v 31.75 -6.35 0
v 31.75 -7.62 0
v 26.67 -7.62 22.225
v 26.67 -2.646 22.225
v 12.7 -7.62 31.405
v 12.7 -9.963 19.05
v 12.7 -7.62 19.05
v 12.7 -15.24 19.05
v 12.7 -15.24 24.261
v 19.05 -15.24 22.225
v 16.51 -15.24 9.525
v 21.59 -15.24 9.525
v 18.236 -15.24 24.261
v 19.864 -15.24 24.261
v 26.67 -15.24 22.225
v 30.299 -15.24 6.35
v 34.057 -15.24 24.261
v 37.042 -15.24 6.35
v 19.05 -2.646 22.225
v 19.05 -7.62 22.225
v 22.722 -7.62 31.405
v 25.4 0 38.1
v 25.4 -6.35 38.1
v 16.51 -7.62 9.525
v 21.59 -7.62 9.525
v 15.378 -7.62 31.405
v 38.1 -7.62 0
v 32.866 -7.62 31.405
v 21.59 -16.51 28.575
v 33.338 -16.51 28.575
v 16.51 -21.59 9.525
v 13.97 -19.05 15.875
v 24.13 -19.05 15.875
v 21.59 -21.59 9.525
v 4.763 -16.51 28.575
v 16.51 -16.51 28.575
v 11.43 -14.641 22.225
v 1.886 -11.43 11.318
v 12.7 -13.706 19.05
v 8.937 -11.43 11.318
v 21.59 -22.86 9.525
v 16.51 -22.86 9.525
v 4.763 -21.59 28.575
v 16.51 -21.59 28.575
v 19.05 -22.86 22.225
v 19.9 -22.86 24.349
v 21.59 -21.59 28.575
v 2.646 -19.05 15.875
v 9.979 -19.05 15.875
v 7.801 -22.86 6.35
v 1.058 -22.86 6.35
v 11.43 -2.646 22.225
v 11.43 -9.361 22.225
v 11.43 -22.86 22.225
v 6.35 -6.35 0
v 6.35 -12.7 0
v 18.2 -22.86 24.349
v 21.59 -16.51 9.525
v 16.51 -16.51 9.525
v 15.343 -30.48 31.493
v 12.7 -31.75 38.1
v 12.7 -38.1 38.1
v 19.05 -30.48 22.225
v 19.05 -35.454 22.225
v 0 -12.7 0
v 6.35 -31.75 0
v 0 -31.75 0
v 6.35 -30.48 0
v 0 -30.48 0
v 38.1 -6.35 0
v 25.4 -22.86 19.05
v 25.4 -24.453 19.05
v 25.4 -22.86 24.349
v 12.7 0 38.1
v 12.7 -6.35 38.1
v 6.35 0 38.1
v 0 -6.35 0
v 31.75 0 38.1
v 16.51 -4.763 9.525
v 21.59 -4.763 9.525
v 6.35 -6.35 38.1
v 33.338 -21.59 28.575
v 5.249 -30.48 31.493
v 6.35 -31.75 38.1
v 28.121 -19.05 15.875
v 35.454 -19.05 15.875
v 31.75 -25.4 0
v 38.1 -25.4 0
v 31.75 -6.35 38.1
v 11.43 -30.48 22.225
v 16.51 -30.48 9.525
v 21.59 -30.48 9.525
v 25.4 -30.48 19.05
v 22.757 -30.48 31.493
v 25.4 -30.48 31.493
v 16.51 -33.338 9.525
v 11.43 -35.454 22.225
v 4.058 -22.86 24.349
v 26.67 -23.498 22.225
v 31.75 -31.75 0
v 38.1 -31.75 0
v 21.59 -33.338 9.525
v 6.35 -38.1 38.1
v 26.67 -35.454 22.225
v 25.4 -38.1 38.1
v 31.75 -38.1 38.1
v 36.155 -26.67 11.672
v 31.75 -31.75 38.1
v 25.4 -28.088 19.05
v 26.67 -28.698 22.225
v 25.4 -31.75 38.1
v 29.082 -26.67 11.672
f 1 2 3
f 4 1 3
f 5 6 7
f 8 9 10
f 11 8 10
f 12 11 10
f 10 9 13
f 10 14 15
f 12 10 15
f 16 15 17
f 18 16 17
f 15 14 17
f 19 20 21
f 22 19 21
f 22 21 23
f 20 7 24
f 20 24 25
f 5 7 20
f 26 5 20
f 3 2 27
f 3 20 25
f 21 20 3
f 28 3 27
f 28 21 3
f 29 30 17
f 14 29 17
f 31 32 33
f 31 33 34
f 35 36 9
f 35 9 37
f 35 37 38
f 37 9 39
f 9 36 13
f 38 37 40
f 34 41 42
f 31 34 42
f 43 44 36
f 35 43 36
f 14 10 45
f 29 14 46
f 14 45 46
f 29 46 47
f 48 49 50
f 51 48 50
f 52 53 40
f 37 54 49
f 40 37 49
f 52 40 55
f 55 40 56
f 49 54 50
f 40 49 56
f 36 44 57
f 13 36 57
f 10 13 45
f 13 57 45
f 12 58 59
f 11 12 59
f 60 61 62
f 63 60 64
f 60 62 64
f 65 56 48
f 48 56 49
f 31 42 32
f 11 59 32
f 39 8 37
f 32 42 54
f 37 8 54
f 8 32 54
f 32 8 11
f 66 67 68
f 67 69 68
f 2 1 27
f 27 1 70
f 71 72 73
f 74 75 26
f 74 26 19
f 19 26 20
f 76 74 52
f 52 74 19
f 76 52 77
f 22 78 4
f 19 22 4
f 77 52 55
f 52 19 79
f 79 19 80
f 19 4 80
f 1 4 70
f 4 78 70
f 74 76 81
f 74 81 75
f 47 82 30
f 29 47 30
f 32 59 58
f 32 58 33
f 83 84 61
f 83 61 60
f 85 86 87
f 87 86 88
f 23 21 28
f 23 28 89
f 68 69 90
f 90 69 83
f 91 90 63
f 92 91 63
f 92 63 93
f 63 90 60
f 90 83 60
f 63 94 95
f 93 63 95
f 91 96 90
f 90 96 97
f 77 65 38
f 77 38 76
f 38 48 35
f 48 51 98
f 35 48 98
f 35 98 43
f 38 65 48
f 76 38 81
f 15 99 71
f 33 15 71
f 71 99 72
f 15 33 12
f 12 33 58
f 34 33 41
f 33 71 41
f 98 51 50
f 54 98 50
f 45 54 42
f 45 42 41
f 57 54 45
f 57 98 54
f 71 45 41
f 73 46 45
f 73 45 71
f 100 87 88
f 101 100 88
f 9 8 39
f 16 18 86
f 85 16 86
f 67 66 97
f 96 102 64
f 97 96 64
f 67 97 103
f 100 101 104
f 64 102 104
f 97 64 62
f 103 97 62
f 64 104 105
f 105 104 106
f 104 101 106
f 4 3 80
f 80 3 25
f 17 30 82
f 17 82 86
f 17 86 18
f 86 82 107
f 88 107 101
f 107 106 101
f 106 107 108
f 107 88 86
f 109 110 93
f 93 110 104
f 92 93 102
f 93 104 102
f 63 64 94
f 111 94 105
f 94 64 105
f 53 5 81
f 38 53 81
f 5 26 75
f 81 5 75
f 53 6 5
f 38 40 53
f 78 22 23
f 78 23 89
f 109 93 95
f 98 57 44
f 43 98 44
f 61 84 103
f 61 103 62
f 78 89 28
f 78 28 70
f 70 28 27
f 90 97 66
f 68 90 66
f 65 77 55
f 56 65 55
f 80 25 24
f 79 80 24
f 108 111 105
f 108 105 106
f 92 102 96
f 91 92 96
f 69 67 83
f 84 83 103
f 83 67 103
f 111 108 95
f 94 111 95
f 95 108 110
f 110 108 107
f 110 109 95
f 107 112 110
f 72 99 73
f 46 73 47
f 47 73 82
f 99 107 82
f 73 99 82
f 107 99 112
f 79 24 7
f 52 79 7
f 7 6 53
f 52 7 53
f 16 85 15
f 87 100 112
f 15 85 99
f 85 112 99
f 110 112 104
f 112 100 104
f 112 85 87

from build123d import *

# Parameters (mm, degrees)
F0_W      = 38.1
F0_H      = 38.1
F1_DEPTH  = 38.1
F6_DEPTH  = 50.8
F8_DEPTH  = 38.1
F9_W      = 25.4
F9_H      = 7.62
F10_DEPTH = 38.1


with BuildPart() as f1:
    # F0 (on Front) → F1 (new body)
    with BuildSketch(Plane.XZ):
        with Locations((19.05, 19.05)):
            Rectangle(F0_W, F0_H)
    extrude(amount=F1_DEPTH)

    # F5 (on offset) → F6 (cut)
    with BuildSketch(Plane.YZ.offset(38.1)):
        Polygon((-11.43, 11.31845), (-6.35, 38.1), (-31.75, 38.1), (-26.67, 11.672141), (-21.59, 28.575), (-16.51, 28.575), align=None)
        Polygon((-31.75, 0), (-38.1, 38.1), (-38.1, 0), align=None)
        Polygon((-25.4, 0), (-12.7, 0), (-19.05, 15.875), align=None)
        Polygon((-6.35, 0), (0, 0), (0, 38.1), align=None)
    extrude(amount=-F6_DEPTH, mode=Mode.SUBTRACT)

    # F7 (on offset) → F8 (cut)
    with BuildSketch(Plane.XZ.offset(38.1)):
        Polygon((0, 38.1), (0, 0), (6.35, 38.1), align=None)
        Polygon((25.4, 38.1), (12.7, 38.1), (19.05, 22.225), align=None)
        Polygon((31.75, 38.1), (38.1, 0), (38.1, 38.1), align=None)
        Polygon((11.43, 22.225), (6.35, 0), (31.75, 0), (26.67, 22.225), (21.59, 9.525), (16.51, 9.525), align=None)
    extrude(amount=-F8_DEPTH, mode=Mode.SUBTRACT)

    # F9 (on offset) → F10 (cut)
    with BuildSketch(Plane.XY.offset(38.1)):
        with Locations((12.7, -26.67)):
            Rectangle(F9_W, F9_H)
        with Locations((25.4, -11.43)):
            Rectangle(F9_W, F9_H)
    extrude(amount=-F10_DEPTH, mode=Mode.SUBTRACT)


solid = f1.part
